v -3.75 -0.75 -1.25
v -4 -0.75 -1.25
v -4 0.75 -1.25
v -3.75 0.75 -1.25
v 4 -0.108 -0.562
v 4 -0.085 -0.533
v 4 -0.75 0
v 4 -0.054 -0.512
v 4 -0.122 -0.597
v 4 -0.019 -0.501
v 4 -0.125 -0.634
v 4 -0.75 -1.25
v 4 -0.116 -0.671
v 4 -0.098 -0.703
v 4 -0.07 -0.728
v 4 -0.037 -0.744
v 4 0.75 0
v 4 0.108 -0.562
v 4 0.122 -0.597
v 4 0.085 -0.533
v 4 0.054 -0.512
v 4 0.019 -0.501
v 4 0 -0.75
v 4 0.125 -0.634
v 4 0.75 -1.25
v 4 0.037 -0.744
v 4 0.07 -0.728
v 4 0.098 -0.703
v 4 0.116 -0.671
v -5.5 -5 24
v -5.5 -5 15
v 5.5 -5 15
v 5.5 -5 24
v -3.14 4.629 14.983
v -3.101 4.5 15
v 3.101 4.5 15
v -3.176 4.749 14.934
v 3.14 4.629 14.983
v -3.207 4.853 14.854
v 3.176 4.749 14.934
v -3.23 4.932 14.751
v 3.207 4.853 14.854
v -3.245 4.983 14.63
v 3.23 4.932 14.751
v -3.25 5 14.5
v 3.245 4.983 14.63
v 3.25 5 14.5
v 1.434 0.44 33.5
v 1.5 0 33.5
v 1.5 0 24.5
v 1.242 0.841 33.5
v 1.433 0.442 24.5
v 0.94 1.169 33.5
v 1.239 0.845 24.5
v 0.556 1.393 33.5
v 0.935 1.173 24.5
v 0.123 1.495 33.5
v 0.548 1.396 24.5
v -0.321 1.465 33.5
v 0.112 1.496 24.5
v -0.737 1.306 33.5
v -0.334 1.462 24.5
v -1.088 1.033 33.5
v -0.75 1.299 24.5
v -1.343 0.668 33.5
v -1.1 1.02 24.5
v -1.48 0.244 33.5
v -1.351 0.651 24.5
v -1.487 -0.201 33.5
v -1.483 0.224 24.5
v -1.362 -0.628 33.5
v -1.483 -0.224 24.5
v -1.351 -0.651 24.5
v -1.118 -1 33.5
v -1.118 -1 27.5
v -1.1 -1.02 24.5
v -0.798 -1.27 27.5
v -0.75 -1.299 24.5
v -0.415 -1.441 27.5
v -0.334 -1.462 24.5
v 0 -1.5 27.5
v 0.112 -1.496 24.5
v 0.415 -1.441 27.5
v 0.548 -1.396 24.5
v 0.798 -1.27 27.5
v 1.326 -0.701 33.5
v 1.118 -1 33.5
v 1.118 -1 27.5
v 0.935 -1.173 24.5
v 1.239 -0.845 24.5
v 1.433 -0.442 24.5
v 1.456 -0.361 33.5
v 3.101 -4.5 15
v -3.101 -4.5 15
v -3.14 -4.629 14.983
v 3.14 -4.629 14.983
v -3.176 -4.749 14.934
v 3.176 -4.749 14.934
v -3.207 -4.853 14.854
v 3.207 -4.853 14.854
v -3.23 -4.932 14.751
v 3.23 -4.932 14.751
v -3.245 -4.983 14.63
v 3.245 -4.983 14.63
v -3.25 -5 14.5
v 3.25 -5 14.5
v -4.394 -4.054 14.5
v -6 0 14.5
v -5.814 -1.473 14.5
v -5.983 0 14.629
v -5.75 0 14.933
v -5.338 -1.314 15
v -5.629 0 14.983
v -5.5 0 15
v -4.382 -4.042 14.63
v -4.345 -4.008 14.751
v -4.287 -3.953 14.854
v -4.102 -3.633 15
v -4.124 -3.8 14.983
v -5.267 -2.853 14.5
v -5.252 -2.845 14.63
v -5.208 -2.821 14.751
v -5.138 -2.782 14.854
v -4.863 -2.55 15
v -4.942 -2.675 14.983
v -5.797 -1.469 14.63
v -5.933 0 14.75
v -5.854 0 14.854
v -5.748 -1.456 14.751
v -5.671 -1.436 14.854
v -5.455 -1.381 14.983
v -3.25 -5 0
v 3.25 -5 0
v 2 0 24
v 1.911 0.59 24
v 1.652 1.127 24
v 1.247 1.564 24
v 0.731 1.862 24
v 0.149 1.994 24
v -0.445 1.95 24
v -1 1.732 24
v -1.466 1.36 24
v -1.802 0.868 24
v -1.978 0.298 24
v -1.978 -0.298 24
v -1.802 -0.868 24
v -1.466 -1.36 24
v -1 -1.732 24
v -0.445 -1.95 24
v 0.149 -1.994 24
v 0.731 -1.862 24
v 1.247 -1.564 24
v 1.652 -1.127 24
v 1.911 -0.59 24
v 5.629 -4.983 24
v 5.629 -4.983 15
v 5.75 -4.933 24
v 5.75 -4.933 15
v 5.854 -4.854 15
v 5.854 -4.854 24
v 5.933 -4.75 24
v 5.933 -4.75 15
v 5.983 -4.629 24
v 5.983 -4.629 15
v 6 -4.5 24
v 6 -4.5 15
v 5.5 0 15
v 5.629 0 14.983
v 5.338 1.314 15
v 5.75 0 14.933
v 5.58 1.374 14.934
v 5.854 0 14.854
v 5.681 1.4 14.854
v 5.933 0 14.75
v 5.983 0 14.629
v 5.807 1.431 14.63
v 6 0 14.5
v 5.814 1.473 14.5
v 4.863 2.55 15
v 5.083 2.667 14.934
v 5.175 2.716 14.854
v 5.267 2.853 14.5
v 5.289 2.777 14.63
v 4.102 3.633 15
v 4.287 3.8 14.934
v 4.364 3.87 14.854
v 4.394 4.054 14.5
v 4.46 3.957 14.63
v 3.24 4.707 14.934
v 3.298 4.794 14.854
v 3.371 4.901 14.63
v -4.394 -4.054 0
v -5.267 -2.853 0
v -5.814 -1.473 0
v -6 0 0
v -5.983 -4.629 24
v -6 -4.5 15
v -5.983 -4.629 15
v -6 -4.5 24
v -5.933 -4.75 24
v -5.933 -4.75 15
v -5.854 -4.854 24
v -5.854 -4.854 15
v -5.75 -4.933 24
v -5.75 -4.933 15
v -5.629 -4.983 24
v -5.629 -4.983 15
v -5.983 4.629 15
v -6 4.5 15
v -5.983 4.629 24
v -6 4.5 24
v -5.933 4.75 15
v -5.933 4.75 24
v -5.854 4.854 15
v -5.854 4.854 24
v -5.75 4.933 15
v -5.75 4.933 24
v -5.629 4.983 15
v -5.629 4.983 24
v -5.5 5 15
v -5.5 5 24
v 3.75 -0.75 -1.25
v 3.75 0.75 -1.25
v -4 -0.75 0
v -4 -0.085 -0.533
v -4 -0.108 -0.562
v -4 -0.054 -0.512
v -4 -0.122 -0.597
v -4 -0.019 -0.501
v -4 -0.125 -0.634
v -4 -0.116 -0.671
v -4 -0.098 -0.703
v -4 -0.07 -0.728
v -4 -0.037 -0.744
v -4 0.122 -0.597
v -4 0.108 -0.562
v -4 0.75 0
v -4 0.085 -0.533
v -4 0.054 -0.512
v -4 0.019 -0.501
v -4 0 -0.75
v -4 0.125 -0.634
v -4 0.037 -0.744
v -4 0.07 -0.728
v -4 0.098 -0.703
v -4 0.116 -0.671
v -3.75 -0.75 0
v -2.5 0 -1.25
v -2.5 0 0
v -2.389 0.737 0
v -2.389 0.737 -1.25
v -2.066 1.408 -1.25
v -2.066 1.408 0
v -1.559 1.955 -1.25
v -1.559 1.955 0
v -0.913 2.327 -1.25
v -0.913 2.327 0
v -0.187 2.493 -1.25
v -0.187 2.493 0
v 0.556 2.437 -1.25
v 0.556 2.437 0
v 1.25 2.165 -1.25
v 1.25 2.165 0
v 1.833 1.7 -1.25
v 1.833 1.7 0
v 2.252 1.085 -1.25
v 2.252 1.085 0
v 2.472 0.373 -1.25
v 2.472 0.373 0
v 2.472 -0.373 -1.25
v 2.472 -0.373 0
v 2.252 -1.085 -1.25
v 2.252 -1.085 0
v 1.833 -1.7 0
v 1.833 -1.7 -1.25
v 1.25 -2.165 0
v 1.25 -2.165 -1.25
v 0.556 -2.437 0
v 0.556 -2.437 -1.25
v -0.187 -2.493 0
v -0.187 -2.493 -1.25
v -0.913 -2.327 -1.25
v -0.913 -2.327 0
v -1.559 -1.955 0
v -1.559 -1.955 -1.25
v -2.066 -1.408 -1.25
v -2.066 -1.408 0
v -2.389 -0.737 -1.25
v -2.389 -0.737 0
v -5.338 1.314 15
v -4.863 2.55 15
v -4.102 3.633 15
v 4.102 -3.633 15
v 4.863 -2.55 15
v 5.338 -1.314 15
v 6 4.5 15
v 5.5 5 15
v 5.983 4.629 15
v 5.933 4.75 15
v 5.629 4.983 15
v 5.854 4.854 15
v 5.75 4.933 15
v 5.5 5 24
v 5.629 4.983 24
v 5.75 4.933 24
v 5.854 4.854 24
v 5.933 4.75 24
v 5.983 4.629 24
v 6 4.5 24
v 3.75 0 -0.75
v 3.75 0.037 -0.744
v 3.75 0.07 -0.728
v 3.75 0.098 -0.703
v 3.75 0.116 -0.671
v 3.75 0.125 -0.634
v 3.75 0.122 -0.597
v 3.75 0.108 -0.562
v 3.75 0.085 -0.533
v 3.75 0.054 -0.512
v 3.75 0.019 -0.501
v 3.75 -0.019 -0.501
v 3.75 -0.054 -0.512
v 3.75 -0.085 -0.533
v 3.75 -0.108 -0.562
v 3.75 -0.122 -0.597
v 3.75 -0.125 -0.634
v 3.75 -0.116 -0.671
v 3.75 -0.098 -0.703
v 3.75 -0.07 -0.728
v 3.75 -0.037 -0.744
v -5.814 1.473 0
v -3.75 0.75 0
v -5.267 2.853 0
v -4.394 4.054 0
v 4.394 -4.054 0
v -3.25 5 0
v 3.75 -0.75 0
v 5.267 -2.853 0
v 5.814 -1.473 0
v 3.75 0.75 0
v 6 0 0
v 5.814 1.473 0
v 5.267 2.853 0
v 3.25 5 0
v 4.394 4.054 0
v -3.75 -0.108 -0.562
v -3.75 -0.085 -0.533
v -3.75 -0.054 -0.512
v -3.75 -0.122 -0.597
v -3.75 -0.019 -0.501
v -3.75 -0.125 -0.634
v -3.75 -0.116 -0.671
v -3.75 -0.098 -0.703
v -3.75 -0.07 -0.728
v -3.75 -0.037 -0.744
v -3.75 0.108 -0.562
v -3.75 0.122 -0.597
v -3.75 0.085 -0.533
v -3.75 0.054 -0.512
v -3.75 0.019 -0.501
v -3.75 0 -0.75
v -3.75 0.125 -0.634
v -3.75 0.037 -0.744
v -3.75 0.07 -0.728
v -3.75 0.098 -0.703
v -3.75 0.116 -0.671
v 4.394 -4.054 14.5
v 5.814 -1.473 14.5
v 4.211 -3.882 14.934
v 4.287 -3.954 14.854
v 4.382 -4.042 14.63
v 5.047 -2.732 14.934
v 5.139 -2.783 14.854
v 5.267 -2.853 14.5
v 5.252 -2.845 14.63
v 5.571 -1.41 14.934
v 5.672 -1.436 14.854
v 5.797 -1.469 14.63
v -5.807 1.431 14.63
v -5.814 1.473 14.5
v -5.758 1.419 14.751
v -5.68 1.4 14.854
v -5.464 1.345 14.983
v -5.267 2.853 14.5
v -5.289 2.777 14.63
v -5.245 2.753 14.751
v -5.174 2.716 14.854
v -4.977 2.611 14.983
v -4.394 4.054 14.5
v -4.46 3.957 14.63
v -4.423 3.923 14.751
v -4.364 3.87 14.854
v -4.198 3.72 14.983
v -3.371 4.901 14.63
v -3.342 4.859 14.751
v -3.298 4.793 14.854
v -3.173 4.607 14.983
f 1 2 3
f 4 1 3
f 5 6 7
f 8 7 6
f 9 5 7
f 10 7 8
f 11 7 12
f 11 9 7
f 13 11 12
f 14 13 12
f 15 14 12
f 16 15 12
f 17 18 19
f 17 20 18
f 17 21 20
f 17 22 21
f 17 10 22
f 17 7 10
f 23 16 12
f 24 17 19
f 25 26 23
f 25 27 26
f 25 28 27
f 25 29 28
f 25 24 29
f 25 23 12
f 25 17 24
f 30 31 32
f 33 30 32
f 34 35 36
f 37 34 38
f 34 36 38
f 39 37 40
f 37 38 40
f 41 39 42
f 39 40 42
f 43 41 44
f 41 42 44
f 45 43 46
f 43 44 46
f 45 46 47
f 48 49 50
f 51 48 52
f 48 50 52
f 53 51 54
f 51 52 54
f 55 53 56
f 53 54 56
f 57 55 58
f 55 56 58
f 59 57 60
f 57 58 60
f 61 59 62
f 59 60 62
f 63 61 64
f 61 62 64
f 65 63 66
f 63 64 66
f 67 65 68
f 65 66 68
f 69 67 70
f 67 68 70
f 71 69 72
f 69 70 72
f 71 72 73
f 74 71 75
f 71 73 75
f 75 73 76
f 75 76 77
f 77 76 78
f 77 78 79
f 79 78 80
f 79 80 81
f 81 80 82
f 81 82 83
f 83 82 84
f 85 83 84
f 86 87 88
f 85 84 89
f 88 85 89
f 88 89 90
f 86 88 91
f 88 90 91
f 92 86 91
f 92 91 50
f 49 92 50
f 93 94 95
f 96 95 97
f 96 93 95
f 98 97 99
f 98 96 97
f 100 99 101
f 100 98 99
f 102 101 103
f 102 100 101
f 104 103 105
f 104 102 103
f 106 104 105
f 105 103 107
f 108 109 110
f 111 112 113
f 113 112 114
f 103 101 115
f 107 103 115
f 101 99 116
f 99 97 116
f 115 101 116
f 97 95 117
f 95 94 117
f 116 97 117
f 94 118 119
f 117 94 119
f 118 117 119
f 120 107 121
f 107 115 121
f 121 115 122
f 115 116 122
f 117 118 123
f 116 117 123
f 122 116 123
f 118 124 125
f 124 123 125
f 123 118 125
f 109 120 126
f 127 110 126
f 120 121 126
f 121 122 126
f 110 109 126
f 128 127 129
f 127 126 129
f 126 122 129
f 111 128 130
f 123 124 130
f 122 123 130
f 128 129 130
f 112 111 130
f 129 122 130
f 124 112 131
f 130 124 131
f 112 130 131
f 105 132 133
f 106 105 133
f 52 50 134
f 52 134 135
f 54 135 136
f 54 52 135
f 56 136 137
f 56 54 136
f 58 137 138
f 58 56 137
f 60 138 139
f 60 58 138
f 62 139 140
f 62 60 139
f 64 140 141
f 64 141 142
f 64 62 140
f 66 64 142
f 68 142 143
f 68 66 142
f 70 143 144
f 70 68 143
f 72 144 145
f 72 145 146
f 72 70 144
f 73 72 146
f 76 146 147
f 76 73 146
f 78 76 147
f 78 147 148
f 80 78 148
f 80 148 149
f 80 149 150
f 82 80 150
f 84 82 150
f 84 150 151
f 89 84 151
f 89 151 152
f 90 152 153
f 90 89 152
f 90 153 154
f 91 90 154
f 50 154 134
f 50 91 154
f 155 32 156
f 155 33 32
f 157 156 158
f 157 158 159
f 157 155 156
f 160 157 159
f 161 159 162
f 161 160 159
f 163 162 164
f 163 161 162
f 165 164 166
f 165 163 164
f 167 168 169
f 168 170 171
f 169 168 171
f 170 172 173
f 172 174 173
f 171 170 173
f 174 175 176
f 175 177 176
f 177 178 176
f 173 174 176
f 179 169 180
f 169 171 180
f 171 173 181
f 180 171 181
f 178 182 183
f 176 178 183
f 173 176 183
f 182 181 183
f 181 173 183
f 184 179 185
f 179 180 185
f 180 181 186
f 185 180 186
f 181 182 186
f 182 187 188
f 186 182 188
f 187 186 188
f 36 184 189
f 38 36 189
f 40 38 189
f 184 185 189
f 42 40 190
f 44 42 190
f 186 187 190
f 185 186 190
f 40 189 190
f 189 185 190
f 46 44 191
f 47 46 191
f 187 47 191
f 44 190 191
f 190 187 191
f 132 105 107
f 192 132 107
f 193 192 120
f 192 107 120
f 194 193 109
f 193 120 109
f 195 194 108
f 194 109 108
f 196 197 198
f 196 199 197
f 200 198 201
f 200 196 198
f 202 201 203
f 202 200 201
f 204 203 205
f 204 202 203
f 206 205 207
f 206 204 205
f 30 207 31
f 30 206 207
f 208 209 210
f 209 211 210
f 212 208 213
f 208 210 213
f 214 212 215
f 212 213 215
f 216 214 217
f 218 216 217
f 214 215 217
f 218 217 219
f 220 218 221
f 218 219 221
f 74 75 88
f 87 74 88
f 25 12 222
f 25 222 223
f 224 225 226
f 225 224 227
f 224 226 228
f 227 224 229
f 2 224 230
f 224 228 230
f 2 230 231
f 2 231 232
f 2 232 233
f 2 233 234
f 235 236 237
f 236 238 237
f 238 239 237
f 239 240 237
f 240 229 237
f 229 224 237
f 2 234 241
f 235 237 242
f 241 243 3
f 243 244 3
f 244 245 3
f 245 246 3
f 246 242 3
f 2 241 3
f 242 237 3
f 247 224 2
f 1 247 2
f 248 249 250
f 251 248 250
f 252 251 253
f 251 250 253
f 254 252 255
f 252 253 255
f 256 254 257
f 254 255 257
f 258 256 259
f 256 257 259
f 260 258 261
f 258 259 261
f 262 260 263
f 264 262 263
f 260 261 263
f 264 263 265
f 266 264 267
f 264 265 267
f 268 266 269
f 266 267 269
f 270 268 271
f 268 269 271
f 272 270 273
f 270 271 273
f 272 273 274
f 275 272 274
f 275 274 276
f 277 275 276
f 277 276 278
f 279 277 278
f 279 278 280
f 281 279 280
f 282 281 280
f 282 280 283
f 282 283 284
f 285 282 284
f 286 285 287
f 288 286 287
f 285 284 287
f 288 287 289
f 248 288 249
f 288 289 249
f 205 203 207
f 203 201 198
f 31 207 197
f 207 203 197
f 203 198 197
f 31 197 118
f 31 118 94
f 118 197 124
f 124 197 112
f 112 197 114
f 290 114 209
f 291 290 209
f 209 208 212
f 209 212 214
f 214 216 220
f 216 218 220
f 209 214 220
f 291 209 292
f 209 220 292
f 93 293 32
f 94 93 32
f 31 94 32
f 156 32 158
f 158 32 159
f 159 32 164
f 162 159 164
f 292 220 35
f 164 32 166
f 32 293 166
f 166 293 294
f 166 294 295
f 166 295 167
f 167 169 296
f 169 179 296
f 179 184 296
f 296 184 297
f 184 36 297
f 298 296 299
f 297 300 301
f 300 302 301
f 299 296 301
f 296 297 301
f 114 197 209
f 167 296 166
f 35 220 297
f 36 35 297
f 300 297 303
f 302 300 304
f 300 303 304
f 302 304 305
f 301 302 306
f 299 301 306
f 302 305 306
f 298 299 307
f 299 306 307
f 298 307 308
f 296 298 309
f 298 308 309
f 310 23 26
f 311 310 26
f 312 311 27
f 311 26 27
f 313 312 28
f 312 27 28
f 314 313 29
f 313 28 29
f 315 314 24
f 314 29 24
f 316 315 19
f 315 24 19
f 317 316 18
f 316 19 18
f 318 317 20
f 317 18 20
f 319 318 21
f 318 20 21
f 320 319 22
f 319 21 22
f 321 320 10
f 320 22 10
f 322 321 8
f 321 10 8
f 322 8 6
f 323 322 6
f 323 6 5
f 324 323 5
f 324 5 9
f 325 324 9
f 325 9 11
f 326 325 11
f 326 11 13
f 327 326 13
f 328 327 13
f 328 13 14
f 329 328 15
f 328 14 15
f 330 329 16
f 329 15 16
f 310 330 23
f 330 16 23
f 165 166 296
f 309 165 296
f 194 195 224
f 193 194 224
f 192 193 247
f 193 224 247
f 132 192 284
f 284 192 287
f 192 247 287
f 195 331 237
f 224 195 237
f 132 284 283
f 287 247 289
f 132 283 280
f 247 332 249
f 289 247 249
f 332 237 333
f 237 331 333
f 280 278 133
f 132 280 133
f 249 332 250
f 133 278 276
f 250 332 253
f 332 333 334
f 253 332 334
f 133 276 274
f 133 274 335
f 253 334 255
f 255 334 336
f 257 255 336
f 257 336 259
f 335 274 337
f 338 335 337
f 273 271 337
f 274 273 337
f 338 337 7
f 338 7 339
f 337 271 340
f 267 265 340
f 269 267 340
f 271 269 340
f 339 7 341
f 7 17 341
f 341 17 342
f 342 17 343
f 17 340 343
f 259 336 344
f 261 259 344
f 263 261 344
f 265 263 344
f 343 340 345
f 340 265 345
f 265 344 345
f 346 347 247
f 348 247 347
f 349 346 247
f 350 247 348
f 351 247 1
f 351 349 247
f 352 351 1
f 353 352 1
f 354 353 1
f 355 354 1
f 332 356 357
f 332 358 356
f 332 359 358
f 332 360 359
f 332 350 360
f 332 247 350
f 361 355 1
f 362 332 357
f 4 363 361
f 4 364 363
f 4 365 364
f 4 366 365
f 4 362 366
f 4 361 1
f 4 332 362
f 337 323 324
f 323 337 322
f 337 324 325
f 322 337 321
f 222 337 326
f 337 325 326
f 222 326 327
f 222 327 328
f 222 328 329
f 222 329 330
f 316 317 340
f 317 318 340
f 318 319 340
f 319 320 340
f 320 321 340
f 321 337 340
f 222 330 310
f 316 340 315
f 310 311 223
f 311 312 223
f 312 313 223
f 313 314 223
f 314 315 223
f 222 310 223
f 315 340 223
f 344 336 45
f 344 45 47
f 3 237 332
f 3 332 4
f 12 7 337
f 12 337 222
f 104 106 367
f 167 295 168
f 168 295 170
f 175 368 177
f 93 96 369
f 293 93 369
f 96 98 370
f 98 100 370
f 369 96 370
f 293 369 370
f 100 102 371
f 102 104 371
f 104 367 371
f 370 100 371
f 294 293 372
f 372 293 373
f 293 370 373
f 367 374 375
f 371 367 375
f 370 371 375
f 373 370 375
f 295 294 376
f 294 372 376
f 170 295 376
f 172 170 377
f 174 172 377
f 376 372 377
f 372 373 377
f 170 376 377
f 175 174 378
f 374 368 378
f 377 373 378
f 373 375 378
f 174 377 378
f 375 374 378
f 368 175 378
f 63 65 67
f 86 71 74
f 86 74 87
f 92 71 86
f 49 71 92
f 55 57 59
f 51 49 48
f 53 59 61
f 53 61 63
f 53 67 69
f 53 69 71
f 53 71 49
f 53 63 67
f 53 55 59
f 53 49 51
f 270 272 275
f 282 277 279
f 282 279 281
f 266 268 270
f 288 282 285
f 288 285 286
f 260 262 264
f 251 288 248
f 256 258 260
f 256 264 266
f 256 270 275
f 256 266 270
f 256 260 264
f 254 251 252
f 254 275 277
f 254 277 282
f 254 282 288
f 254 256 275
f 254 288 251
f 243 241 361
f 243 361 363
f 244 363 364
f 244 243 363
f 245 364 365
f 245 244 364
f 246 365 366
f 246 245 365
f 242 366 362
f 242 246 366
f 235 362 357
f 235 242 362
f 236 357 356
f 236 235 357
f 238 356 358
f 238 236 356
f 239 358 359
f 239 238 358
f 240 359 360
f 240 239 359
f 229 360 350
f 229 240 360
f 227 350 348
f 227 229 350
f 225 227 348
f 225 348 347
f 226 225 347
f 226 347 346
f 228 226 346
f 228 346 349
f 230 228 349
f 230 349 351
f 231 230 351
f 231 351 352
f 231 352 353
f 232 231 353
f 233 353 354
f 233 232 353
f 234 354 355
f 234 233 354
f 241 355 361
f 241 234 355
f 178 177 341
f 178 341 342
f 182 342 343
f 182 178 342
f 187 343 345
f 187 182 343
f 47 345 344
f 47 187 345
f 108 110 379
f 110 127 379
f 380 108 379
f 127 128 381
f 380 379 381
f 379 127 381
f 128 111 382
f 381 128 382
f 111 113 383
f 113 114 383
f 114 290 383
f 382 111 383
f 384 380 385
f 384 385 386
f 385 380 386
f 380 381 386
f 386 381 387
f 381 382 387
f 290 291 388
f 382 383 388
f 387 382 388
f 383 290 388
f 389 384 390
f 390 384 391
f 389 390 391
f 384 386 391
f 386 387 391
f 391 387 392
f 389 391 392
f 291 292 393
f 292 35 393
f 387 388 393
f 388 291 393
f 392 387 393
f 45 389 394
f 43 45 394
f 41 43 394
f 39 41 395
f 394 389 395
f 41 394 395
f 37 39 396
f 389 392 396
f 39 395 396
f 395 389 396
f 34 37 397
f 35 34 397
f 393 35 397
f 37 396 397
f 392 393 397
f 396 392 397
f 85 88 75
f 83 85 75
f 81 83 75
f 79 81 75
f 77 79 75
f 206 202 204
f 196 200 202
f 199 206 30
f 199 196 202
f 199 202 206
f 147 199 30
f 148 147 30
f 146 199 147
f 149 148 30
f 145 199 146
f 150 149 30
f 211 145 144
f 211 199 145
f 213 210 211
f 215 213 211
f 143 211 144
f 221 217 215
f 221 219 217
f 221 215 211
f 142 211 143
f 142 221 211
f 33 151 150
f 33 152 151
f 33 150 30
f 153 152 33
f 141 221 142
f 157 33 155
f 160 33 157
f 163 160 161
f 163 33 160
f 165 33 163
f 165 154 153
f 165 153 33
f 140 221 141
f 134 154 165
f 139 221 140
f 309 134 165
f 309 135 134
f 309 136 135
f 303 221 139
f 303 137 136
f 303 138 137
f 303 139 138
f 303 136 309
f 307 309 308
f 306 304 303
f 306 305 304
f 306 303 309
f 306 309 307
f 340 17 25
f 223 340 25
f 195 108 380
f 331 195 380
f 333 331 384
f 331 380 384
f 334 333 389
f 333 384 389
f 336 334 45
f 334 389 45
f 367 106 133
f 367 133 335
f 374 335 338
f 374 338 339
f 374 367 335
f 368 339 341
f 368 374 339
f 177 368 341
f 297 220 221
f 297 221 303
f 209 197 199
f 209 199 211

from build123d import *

# Parameters (mm, degrees)
SKETCH1_W           = 12
SKETCH1_H           = 10
BOSS_EXTRUDE1_DEPTH = 15
CUT_EXTRUDE1_DEPTH  = 17.911534525
SKETCH3_R           = 2.5
BOSS_EXTRUDE2_DEPTH = 1.25
SKETCH4_W           = 1.25
SKETCH4_H           = 1.5
SKETCH4_R           = 0.125
BOSS_EXTRUDE3_DEPTH = 0.25
FILLET2_R           = 0.5
SKETCH5_W           = 12
SKETCH5_H           = 10
BOSS_EXTRUDE4_DEPTH = 9
FILLET1_R           = 0.5
SKETCH6_R           = 1.5
BOSS_EXTRUDE5_DEPTH = 9.5
CHAMFER1_SIZE       = 0.5
CUT_EXTRUDE2_START  = -6
CUT_EXTRUDE2_DEPTH  = 6


with BuildPart() as part:
    # Sketch1 → Boss-Extrude1 (new body)
    with BuildSketch(Plane.XY):
        Rectangle(SKETCH1_W, SKETCH1_H)
    extrude(amount=BOSS_EXTRUDE1_DEPTH)

    # Sketch2 → Cut-Extrude1 (cut, through all)
    with BuildSketch(Plane.XY.offset(15)):
        with BuildLine():
            ThreePointArc((-6, 0), (-5.267141914, 2.853178053), (-3.25, 5))
            Line((-3.25, 5), (-6, 5))
            Line((-6, 5), (-6, 0))
        make_face()
        with BuildLine():
            ThreePointArc((-3.25, -5), (-5.267141914, -2.853178053), (-6, 0))
            Line((-6, 0), (-6, -5))
            Line((-6, -5), (-3.25, -5))
        make_face()
    cut_extrude1 = extrude(amount=-CUT_EXTRUDE1_DEPTH, mode=Mode.SUBTRACT)

    # Mirror1: Cut-Extrude1 across plane
    add(cut_extrude1.mirror(Plane(origin=(0, 0, 0), x_dir=(0, 0, 1), z_dir=(1, 0, 0))), mode=Mode.SUBTRACT)

    # Sketch3 → Boss-Extrude2 (add)
    with BuildSketch(Plane(origin=(0, 0, 0), x_dir=(-1, 0, 0), z_dir=(0, 0, -1))):
        Circle(SKETCH3_R)
    extrude(amount=BOSS_EXTRUDE2_DEPTH)

    # Sketch4 → Boss-Extrude3 (add)
    with BuildSketch(Plane(origin=(4, 0, 0), x_dir=(0, 0, -1), z_dir=(1, 0, 0))):
        with Locations((0.625, 0)):
            Rectangle(SKETCH4_W, SKETCH4_H)
        with Locations((0.625, 0)):
            Circle(SKETCH4_R, mode=Mode.SUBTRACT)
    boss_extrude3 = extrude(amount=-BOSS_EXTRUDE3_DEPTH)

    # Mirror2: Boss-Extrude3 across plane
    add(boss_extrude3.mirror(Plane(origin=(0, 0, 0), x_dir=(0, 0, 1), z_dir=(1, 0, 0))))

    # Fillet2
    fillet2_edges = [part.edges().sort_by_distance(p)[0] for p in [
        (-6, 0, 15),
        (0, -5, 15),
        (0, 5, 15),
        (6, 0, 15),
    ]]
    fillet(fillet2_edges, radius=FILLET2_R)

    # Sketch5 → Boss-Extrude4 (add)
    with BuildSketch(Plane.XY.offset(15)):
        Rectangle(SKETCH5_W, SKETCH5_H)
    extrude(amount=BOSS_EXTRUDE4_DEPTH)

    # Fillet1
    fillet1_edges = [part.edges().sort_by_distance(p)[0] for p in [
        (6, 5, 19.5),
        (-6, 5, 19.5),
        (-6, -5, 19.5),
        (6, -5, 19.5),
    ]]
    fillet(fillet1_edges, radius=FILLET1_R)

    # Sketch6 → Boss-Extrude5 (add)
    with BuildSketch(Plane.XY.offset(24)):
        Circle(SKETCH6_R)
    extrude(amount=BOSS_EXTRUDE5_DEPTH)

    # Chamfer1
    chamfer1_edges = [part.edges().sort_by_distance(p)[0] for p in [
        (-1.5, 0, 24),
    ]]
    chamfer(chamfer1_edges, length=CHAMFER1_SIZE)

    # Sketch7 → Cut-Extrude2 (cut)
    with BuildSketch(Plane.XY.offset(33.5).offset(CUT_EXTRUDE2_START)):
        with BuildLine():
            Line((-1.118033989, -1), (1.118033989, -1))
            ThreePointArc((1.118033989, -1), (0, -1.5), (-1.118033989, -1))
        make_face()
    extrude(amount=CUT_EXTRUDE2_DEPTH, mode=Mode.SUBTRACT)


solid = part.part
